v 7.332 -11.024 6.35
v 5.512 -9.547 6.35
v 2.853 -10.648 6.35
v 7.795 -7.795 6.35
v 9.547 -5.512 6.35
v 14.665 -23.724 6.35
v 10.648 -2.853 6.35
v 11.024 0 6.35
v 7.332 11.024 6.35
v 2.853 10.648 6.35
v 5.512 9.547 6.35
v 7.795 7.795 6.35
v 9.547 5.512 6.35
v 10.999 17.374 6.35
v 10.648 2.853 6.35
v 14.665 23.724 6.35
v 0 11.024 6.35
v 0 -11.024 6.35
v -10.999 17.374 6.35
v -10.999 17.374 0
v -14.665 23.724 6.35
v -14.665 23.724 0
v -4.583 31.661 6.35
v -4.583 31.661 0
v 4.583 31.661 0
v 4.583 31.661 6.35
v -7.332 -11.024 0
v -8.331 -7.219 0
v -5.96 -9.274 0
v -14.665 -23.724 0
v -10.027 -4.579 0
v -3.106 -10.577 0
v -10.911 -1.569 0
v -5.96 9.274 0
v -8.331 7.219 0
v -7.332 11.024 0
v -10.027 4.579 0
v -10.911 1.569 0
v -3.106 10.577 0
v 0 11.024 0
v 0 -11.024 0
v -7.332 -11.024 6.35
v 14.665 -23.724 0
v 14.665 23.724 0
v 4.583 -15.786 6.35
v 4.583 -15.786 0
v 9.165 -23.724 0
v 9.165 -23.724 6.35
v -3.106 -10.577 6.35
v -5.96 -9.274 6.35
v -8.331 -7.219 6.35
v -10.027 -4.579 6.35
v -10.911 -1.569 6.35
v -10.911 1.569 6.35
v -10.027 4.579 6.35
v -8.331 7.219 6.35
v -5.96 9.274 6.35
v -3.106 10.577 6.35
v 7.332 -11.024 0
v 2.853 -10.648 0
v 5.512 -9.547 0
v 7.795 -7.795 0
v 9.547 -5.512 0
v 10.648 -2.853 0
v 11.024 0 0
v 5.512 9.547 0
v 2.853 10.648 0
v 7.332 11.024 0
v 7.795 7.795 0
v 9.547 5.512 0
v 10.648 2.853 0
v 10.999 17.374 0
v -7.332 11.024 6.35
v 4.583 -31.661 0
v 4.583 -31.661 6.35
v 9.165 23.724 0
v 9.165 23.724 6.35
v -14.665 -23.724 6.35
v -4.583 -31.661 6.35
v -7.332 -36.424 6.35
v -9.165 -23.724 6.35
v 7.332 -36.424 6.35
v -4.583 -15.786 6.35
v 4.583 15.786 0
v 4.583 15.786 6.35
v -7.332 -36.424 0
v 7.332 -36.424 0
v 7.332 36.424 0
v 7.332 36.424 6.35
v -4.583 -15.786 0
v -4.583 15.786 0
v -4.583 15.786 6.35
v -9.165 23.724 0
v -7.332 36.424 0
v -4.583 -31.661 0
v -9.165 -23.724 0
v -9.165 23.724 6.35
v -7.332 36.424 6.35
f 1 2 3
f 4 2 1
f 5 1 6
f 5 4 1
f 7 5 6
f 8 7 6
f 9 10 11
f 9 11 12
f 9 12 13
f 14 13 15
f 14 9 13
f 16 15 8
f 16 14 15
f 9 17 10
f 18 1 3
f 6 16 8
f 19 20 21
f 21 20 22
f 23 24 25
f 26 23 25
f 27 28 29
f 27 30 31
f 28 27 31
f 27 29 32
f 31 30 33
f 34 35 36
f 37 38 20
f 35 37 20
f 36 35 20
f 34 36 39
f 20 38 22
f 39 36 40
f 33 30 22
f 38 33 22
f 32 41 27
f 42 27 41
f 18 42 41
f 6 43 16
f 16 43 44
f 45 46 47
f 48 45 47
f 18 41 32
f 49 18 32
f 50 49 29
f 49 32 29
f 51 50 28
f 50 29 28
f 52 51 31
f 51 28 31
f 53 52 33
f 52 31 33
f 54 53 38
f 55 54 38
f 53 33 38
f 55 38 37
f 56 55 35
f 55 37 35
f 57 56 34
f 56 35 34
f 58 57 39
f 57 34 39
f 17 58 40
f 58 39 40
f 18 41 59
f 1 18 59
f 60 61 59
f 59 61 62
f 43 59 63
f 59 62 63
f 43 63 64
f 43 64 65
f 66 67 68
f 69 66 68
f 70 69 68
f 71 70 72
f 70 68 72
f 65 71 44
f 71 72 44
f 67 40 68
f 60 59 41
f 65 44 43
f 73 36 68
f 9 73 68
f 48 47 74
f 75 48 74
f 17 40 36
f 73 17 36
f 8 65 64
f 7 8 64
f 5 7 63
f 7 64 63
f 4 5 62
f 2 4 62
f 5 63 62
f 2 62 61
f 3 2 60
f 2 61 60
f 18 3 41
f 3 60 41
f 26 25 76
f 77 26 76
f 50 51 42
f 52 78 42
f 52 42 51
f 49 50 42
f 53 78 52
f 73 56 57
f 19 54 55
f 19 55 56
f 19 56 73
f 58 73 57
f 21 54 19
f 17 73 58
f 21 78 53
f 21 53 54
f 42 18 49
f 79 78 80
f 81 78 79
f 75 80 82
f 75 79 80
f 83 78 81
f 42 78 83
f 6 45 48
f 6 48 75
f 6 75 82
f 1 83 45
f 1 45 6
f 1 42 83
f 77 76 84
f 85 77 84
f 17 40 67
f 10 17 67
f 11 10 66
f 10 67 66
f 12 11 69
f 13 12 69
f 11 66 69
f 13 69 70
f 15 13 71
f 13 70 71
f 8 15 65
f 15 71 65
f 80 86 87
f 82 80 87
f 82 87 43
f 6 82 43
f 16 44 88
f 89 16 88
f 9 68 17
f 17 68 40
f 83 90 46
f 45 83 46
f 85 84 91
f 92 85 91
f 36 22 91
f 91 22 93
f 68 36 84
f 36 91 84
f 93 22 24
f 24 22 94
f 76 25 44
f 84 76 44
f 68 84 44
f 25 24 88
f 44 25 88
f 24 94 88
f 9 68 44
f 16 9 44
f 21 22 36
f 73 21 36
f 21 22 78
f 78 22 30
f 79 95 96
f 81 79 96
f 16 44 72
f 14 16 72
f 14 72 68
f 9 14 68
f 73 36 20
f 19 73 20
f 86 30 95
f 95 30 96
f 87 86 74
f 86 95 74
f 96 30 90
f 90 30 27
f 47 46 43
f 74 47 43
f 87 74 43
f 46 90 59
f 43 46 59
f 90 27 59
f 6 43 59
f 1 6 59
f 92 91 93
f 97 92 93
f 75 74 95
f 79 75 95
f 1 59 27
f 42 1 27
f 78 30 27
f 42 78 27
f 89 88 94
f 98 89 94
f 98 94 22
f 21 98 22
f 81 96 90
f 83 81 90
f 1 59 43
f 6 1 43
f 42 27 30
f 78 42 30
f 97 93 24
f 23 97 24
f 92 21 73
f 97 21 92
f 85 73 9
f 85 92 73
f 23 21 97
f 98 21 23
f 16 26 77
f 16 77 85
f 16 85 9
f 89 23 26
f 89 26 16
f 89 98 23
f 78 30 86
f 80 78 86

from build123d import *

# Parameters (mm, degrees)
F2_DEPTH = 6.35


with BuildPart() as f2:
    # F0 (on Top) → F2 (new body)
    with BuildSketch(Plane.XY):
        Polygon((-7.3323484187, 11.0236), (0, 11.0236), (7.3323484187, 11.0236), (14.6646968374, 23.7236), (7.3323484187, 36.4236), (-7.3323484187, 36.4236), (-14.6646968374, 23.7236), align=None)
        Polygon((9.1654355234, 23.7236), (4.5827177617, 15.7861), (-4.5827177617, 15.7861), (-9.1654355234, 23.7236), (-4.5827177617, 31.6611), (4.5827177617, 31.6611), align=None, mode=Mode.SUBTRACT)
    extrude(amount=F2_DEPTH)


with BuildPart() as f2b:
    # F0 (on Top) → F2, piece 2 (new body)
    with BuildSketch(Plane.XY):
        Polygon((7.3323484187, -11.0236), (0, -11.0236), (-7.3323484187, -11.0236), (-14.6646968374, -23.7236), (-7.3323484187, -36.4236), (7.3323484187, -36.4236), (14.6646968374, -23.7236), align=None)
        Polygon((4.5827177617, -15.7861), (9.1654355234, -23.7236), (4.5827177617, -31.6611), (-4.5827177617, -31.6611), (-9.1654355234, -23.7236), (-4.5827177617, -15.7861), align=None, mode=Mode.SUBTRACT)
    extrude(amount=F2_DEPTH)


with BuildPart() as f2c:
    # F1 (on Top) → F2, piece 3 (new body)
    with BuildSketch(Plane.XY):
        with BuildLine():
            ThreePointArc((0, -11.0236), (-11.0236, 5.2e-09), (1.03e-08, 11.0236))
            Line((1.03e-08, 11.0236), (-7.3323484187, 11.0236))
            Line((-7.3323484187, 11.0236), (-10.9985224446, 17.3735996823))
            Line((-10.9985224446, 17.3735996823), (-14.6646968374, 23.7236))
            Line((-14.6646968374, 23.7236), (-14.6646968374, -23.7236))
            Line((-14.6646968374, -23.7236), (-7.3323484187, -11.0236))
            Line((-7.3323484187, -11.0236), (0, -11.0236))
        make_face()
    extrude(amount=F2_DEPTH)


with BuildPart() as f2d:
    # F1 (on Top) → F2, piece 4 (new body)
    with BuildSketch(Plane.XY):
        with BuildLine():
            Line((14.6646968374, 23.7236), (10.9985223809, 17.373599572))
            Line((10.9985223809, 17.373599572), (7.3323484187, 11.0236))
            Line((7.3323484187, 11.0236), (1.03e-08, 11.0236))
            ThreePointArc((1.03e-08, 11.0236), (7.7948623167, 7.7948623094), (11.0236, 0))
            ThreePointArc((11.0236, 0), (7.7948623131, -7.7948623131), (0, -11.0236))
            Line((0, -11.0236), (7.3323484187, -11.0236))
            Line((7.3323484187, -11.0236), (14.6646968374, -23.7236))
            Line((14.6646968374, -23.7236), (14.6646968374, 23.7236))
        make_face()
    extrude(amount=F2_DEPTH)


solid = Compound([f2.part, f2b.part, f2c.part, f2d.part])
